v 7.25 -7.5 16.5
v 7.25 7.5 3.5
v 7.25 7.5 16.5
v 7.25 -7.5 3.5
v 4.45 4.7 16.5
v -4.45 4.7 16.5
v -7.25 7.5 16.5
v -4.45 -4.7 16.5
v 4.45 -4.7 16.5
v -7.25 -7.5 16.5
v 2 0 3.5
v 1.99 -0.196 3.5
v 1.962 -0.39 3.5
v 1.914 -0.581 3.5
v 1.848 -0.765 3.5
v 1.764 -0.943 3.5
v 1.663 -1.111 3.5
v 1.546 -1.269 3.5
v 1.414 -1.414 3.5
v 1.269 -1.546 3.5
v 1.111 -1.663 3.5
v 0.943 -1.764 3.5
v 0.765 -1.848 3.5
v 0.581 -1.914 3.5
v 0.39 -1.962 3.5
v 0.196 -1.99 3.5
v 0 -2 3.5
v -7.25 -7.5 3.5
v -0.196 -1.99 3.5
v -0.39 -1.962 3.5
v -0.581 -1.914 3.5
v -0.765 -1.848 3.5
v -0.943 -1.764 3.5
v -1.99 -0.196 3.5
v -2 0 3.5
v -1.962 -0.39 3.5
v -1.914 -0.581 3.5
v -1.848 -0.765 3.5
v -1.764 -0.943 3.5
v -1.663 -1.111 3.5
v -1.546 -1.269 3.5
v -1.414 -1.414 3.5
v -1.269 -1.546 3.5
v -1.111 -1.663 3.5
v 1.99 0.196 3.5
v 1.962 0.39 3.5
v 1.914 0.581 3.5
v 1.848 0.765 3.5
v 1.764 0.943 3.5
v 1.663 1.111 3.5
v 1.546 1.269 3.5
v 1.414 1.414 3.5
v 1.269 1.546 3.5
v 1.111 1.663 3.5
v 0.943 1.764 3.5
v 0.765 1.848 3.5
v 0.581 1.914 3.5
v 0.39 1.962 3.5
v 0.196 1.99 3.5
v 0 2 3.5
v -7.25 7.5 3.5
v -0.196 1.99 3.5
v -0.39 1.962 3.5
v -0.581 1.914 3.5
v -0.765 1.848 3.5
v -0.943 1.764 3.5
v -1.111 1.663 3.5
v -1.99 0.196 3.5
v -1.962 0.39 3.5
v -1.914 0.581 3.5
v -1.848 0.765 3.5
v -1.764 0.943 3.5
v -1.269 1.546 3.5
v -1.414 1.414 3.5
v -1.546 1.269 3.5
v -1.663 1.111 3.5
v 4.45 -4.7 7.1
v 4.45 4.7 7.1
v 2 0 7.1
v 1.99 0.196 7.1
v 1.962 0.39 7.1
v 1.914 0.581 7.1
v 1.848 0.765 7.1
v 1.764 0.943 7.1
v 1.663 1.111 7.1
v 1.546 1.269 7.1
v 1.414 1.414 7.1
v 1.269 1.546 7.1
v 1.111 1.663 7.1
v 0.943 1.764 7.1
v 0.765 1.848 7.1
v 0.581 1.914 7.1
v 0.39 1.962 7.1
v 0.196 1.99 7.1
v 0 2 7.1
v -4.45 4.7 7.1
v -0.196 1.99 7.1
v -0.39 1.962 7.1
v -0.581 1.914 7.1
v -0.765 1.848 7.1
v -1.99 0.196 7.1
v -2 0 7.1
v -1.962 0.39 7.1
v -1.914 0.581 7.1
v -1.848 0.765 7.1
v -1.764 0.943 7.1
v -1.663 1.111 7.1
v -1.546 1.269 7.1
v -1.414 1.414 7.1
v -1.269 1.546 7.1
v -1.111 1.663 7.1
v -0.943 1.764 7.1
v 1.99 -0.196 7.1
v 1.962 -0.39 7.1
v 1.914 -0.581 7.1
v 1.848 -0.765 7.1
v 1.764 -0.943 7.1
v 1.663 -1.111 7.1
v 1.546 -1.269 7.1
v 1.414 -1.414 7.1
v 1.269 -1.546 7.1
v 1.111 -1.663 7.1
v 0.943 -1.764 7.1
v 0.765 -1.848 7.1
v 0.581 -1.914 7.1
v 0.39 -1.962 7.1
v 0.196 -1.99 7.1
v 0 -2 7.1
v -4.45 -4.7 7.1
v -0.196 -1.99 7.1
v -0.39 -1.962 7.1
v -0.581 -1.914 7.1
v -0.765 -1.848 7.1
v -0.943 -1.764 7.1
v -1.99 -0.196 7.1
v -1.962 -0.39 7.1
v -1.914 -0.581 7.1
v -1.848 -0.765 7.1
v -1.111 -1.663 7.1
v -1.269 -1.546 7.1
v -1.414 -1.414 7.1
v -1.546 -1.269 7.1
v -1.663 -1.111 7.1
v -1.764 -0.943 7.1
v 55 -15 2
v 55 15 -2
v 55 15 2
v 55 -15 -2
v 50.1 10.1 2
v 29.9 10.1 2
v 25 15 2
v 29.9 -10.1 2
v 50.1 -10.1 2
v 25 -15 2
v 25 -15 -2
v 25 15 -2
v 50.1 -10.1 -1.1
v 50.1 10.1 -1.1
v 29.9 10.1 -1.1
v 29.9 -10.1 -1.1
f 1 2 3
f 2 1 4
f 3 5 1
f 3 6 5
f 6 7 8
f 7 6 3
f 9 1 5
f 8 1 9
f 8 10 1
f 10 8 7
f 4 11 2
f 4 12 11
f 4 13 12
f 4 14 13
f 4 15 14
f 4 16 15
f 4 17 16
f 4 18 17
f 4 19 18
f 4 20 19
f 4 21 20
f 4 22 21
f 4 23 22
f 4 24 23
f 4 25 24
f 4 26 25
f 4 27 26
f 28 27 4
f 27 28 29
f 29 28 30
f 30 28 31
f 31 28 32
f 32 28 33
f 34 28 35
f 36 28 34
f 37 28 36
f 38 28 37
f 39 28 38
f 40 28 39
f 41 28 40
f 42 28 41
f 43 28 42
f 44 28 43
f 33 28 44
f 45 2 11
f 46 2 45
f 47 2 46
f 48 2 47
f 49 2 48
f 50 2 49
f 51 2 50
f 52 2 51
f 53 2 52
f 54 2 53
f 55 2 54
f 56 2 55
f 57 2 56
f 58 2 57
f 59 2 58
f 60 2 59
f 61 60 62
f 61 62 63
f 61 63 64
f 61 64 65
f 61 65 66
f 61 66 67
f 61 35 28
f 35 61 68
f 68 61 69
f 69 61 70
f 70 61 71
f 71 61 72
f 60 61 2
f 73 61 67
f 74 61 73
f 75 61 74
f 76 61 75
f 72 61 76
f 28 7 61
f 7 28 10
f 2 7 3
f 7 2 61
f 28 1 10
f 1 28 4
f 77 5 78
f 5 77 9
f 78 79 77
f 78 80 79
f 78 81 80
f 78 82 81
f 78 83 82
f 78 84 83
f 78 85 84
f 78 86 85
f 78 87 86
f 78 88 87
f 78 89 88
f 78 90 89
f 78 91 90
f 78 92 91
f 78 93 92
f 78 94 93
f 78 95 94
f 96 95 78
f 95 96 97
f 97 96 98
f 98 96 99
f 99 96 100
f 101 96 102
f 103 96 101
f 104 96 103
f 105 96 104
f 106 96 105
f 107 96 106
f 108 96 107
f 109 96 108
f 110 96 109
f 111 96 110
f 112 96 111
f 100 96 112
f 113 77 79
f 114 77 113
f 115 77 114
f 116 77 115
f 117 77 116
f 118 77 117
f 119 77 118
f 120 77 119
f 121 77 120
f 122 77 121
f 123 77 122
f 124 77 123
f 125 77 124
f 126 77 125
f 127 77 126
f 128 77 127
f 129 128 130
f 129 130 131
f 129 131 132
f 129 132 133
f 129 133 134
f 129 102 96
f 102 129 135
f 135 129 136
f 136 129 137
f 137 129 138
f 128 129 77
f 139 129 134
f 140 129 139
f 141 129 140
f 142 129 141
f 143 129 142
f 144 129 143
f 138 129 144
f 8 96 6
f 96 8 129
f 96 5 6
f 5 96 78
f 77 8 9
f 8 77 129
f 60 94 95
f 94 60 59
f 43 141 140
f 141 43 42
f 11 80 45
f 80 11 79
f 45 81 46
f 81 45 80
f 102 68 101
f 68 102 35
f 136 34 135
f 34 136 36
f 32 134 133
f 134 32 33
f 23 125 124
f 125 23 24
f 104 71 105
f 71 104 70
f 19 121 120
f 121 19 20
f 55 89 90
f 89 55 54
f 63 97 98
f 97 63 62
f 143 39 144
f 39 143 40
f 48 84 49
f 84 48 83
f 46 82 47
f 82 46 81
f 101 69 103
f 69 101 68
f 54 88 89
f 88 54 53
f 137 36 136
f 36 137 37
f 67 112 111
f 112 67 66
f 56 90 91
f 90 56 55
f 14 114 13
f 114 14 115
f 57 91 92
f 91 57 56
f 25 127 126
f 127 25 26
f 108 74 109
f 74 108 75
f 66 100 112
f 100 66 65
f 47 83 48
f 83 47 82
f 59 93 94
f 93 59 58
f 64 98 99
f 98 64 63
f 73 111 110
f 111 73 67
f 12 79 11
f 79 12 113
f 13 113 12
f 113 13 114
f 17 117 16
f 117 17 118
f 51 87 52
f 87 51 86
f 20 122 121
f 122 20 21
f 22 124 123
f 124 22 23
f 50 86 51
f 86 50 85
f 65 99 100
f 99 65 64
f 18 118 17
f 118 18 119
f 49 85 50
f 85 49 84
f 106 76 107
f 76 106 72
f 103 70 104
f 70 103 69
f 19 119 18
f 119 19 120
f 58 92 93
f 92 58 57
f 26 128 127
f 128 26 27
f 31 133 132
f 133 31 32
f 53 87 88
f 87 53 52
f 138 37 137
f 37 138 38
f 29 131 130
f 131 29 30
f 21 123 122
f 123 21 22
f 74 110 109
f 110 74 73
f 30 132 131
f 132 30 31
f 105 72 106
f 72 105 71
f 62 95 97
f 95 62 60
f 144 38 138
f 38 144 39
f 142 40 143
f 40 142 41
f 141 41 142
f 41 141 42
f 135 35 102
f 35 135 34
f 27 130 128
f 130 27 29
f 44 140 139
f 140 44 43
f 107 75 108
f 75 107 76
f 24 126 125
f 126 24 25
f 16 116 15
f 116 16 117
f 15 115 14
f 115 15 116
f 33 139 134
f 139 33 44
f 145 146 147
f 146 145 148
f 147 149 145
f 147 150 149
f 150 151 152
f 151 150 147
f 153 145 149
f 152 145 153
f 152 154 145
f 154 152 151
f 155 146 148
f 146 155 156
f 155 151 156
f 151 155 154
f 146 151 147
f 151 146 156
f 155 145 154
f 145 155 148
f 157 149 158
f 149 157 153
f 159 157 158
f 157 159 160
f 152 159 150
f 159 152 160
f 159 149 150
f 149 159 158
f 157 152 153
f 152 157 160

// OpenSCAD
// DittoBot / Voxel Box Bot
// Phase 0 Exact Force Fixture — OpenSCAD
// Independent Fab Package addition  |  2026-11-05
// Design owned by Craig. Started Nov/Dec 2025. Programmable matter.
//
// Purpose: clamp one finished EPM with pole faces parallel and exposed
// so any makerspace can pull ≥ 3.0 N ON / < 0.3 N OFF in ten minutes.
// Print in PLA/PETG or machine from plastic/aluminum. Non-magnetic preferred.
//
// Units: millimeters
// Export: F6 render → STL for the clamp body and the steel-target holder.

$fn = 64;

// ---- EPM envelope (finished coil) ----
epm_od          =  8.5;     // max allowed coil OD
epm_length      =  9.0;     // pole height
pole_face_d     =  5.0;

// ---- Clamp body ----
clamp_wall      =  3.0;
clamp_base_z    =  4.0;
clamp_opening   =  epm_od + 0.4;   // slight clearance
pull_hook_d     =  4.0;            // for luggage-scale hook or string

module clamp_body() {
    difference() {
        // outer block
        cube([epm_od + 2*clamp_wall, epm_length + 2*clamp_wall, epm_length + clamp_base_z], center=true);
        // EPM pocket (open toward working face, +Z)
        translate([0, 0, clamp_base_z/2 + 0.1])
            cube([clamp_opening, epm_length + 0.4, epm_length + 1], center=true);
        // pull-hook hole through the base (for axial pull)
        translate([0, 0, -epm_length/2 - clamp_base_z/2 + 1])
            cylinder(h=clamp_base_z + 2, d=pull_hook_d, center=true);
    }
}

// ---- Mild-steel target (reference only — cut real steel separately) ----
// This module is for a 3D-printed alignment jig; the actual target is steel.
module steel_target_jig() {
    difference() {
        cube([30, 30, 4], center=true);
        // recess that seats a 20×20×3 mm mild-steel coupon flush
        translate([0, 0, 0.5])
            cube([20.2, 20.2, 3.2], center=true);
    }
}

// Render both
translate([0, 0, 10]) clamp_body();
translate([40, 0, 0]) steel_target_jig();
